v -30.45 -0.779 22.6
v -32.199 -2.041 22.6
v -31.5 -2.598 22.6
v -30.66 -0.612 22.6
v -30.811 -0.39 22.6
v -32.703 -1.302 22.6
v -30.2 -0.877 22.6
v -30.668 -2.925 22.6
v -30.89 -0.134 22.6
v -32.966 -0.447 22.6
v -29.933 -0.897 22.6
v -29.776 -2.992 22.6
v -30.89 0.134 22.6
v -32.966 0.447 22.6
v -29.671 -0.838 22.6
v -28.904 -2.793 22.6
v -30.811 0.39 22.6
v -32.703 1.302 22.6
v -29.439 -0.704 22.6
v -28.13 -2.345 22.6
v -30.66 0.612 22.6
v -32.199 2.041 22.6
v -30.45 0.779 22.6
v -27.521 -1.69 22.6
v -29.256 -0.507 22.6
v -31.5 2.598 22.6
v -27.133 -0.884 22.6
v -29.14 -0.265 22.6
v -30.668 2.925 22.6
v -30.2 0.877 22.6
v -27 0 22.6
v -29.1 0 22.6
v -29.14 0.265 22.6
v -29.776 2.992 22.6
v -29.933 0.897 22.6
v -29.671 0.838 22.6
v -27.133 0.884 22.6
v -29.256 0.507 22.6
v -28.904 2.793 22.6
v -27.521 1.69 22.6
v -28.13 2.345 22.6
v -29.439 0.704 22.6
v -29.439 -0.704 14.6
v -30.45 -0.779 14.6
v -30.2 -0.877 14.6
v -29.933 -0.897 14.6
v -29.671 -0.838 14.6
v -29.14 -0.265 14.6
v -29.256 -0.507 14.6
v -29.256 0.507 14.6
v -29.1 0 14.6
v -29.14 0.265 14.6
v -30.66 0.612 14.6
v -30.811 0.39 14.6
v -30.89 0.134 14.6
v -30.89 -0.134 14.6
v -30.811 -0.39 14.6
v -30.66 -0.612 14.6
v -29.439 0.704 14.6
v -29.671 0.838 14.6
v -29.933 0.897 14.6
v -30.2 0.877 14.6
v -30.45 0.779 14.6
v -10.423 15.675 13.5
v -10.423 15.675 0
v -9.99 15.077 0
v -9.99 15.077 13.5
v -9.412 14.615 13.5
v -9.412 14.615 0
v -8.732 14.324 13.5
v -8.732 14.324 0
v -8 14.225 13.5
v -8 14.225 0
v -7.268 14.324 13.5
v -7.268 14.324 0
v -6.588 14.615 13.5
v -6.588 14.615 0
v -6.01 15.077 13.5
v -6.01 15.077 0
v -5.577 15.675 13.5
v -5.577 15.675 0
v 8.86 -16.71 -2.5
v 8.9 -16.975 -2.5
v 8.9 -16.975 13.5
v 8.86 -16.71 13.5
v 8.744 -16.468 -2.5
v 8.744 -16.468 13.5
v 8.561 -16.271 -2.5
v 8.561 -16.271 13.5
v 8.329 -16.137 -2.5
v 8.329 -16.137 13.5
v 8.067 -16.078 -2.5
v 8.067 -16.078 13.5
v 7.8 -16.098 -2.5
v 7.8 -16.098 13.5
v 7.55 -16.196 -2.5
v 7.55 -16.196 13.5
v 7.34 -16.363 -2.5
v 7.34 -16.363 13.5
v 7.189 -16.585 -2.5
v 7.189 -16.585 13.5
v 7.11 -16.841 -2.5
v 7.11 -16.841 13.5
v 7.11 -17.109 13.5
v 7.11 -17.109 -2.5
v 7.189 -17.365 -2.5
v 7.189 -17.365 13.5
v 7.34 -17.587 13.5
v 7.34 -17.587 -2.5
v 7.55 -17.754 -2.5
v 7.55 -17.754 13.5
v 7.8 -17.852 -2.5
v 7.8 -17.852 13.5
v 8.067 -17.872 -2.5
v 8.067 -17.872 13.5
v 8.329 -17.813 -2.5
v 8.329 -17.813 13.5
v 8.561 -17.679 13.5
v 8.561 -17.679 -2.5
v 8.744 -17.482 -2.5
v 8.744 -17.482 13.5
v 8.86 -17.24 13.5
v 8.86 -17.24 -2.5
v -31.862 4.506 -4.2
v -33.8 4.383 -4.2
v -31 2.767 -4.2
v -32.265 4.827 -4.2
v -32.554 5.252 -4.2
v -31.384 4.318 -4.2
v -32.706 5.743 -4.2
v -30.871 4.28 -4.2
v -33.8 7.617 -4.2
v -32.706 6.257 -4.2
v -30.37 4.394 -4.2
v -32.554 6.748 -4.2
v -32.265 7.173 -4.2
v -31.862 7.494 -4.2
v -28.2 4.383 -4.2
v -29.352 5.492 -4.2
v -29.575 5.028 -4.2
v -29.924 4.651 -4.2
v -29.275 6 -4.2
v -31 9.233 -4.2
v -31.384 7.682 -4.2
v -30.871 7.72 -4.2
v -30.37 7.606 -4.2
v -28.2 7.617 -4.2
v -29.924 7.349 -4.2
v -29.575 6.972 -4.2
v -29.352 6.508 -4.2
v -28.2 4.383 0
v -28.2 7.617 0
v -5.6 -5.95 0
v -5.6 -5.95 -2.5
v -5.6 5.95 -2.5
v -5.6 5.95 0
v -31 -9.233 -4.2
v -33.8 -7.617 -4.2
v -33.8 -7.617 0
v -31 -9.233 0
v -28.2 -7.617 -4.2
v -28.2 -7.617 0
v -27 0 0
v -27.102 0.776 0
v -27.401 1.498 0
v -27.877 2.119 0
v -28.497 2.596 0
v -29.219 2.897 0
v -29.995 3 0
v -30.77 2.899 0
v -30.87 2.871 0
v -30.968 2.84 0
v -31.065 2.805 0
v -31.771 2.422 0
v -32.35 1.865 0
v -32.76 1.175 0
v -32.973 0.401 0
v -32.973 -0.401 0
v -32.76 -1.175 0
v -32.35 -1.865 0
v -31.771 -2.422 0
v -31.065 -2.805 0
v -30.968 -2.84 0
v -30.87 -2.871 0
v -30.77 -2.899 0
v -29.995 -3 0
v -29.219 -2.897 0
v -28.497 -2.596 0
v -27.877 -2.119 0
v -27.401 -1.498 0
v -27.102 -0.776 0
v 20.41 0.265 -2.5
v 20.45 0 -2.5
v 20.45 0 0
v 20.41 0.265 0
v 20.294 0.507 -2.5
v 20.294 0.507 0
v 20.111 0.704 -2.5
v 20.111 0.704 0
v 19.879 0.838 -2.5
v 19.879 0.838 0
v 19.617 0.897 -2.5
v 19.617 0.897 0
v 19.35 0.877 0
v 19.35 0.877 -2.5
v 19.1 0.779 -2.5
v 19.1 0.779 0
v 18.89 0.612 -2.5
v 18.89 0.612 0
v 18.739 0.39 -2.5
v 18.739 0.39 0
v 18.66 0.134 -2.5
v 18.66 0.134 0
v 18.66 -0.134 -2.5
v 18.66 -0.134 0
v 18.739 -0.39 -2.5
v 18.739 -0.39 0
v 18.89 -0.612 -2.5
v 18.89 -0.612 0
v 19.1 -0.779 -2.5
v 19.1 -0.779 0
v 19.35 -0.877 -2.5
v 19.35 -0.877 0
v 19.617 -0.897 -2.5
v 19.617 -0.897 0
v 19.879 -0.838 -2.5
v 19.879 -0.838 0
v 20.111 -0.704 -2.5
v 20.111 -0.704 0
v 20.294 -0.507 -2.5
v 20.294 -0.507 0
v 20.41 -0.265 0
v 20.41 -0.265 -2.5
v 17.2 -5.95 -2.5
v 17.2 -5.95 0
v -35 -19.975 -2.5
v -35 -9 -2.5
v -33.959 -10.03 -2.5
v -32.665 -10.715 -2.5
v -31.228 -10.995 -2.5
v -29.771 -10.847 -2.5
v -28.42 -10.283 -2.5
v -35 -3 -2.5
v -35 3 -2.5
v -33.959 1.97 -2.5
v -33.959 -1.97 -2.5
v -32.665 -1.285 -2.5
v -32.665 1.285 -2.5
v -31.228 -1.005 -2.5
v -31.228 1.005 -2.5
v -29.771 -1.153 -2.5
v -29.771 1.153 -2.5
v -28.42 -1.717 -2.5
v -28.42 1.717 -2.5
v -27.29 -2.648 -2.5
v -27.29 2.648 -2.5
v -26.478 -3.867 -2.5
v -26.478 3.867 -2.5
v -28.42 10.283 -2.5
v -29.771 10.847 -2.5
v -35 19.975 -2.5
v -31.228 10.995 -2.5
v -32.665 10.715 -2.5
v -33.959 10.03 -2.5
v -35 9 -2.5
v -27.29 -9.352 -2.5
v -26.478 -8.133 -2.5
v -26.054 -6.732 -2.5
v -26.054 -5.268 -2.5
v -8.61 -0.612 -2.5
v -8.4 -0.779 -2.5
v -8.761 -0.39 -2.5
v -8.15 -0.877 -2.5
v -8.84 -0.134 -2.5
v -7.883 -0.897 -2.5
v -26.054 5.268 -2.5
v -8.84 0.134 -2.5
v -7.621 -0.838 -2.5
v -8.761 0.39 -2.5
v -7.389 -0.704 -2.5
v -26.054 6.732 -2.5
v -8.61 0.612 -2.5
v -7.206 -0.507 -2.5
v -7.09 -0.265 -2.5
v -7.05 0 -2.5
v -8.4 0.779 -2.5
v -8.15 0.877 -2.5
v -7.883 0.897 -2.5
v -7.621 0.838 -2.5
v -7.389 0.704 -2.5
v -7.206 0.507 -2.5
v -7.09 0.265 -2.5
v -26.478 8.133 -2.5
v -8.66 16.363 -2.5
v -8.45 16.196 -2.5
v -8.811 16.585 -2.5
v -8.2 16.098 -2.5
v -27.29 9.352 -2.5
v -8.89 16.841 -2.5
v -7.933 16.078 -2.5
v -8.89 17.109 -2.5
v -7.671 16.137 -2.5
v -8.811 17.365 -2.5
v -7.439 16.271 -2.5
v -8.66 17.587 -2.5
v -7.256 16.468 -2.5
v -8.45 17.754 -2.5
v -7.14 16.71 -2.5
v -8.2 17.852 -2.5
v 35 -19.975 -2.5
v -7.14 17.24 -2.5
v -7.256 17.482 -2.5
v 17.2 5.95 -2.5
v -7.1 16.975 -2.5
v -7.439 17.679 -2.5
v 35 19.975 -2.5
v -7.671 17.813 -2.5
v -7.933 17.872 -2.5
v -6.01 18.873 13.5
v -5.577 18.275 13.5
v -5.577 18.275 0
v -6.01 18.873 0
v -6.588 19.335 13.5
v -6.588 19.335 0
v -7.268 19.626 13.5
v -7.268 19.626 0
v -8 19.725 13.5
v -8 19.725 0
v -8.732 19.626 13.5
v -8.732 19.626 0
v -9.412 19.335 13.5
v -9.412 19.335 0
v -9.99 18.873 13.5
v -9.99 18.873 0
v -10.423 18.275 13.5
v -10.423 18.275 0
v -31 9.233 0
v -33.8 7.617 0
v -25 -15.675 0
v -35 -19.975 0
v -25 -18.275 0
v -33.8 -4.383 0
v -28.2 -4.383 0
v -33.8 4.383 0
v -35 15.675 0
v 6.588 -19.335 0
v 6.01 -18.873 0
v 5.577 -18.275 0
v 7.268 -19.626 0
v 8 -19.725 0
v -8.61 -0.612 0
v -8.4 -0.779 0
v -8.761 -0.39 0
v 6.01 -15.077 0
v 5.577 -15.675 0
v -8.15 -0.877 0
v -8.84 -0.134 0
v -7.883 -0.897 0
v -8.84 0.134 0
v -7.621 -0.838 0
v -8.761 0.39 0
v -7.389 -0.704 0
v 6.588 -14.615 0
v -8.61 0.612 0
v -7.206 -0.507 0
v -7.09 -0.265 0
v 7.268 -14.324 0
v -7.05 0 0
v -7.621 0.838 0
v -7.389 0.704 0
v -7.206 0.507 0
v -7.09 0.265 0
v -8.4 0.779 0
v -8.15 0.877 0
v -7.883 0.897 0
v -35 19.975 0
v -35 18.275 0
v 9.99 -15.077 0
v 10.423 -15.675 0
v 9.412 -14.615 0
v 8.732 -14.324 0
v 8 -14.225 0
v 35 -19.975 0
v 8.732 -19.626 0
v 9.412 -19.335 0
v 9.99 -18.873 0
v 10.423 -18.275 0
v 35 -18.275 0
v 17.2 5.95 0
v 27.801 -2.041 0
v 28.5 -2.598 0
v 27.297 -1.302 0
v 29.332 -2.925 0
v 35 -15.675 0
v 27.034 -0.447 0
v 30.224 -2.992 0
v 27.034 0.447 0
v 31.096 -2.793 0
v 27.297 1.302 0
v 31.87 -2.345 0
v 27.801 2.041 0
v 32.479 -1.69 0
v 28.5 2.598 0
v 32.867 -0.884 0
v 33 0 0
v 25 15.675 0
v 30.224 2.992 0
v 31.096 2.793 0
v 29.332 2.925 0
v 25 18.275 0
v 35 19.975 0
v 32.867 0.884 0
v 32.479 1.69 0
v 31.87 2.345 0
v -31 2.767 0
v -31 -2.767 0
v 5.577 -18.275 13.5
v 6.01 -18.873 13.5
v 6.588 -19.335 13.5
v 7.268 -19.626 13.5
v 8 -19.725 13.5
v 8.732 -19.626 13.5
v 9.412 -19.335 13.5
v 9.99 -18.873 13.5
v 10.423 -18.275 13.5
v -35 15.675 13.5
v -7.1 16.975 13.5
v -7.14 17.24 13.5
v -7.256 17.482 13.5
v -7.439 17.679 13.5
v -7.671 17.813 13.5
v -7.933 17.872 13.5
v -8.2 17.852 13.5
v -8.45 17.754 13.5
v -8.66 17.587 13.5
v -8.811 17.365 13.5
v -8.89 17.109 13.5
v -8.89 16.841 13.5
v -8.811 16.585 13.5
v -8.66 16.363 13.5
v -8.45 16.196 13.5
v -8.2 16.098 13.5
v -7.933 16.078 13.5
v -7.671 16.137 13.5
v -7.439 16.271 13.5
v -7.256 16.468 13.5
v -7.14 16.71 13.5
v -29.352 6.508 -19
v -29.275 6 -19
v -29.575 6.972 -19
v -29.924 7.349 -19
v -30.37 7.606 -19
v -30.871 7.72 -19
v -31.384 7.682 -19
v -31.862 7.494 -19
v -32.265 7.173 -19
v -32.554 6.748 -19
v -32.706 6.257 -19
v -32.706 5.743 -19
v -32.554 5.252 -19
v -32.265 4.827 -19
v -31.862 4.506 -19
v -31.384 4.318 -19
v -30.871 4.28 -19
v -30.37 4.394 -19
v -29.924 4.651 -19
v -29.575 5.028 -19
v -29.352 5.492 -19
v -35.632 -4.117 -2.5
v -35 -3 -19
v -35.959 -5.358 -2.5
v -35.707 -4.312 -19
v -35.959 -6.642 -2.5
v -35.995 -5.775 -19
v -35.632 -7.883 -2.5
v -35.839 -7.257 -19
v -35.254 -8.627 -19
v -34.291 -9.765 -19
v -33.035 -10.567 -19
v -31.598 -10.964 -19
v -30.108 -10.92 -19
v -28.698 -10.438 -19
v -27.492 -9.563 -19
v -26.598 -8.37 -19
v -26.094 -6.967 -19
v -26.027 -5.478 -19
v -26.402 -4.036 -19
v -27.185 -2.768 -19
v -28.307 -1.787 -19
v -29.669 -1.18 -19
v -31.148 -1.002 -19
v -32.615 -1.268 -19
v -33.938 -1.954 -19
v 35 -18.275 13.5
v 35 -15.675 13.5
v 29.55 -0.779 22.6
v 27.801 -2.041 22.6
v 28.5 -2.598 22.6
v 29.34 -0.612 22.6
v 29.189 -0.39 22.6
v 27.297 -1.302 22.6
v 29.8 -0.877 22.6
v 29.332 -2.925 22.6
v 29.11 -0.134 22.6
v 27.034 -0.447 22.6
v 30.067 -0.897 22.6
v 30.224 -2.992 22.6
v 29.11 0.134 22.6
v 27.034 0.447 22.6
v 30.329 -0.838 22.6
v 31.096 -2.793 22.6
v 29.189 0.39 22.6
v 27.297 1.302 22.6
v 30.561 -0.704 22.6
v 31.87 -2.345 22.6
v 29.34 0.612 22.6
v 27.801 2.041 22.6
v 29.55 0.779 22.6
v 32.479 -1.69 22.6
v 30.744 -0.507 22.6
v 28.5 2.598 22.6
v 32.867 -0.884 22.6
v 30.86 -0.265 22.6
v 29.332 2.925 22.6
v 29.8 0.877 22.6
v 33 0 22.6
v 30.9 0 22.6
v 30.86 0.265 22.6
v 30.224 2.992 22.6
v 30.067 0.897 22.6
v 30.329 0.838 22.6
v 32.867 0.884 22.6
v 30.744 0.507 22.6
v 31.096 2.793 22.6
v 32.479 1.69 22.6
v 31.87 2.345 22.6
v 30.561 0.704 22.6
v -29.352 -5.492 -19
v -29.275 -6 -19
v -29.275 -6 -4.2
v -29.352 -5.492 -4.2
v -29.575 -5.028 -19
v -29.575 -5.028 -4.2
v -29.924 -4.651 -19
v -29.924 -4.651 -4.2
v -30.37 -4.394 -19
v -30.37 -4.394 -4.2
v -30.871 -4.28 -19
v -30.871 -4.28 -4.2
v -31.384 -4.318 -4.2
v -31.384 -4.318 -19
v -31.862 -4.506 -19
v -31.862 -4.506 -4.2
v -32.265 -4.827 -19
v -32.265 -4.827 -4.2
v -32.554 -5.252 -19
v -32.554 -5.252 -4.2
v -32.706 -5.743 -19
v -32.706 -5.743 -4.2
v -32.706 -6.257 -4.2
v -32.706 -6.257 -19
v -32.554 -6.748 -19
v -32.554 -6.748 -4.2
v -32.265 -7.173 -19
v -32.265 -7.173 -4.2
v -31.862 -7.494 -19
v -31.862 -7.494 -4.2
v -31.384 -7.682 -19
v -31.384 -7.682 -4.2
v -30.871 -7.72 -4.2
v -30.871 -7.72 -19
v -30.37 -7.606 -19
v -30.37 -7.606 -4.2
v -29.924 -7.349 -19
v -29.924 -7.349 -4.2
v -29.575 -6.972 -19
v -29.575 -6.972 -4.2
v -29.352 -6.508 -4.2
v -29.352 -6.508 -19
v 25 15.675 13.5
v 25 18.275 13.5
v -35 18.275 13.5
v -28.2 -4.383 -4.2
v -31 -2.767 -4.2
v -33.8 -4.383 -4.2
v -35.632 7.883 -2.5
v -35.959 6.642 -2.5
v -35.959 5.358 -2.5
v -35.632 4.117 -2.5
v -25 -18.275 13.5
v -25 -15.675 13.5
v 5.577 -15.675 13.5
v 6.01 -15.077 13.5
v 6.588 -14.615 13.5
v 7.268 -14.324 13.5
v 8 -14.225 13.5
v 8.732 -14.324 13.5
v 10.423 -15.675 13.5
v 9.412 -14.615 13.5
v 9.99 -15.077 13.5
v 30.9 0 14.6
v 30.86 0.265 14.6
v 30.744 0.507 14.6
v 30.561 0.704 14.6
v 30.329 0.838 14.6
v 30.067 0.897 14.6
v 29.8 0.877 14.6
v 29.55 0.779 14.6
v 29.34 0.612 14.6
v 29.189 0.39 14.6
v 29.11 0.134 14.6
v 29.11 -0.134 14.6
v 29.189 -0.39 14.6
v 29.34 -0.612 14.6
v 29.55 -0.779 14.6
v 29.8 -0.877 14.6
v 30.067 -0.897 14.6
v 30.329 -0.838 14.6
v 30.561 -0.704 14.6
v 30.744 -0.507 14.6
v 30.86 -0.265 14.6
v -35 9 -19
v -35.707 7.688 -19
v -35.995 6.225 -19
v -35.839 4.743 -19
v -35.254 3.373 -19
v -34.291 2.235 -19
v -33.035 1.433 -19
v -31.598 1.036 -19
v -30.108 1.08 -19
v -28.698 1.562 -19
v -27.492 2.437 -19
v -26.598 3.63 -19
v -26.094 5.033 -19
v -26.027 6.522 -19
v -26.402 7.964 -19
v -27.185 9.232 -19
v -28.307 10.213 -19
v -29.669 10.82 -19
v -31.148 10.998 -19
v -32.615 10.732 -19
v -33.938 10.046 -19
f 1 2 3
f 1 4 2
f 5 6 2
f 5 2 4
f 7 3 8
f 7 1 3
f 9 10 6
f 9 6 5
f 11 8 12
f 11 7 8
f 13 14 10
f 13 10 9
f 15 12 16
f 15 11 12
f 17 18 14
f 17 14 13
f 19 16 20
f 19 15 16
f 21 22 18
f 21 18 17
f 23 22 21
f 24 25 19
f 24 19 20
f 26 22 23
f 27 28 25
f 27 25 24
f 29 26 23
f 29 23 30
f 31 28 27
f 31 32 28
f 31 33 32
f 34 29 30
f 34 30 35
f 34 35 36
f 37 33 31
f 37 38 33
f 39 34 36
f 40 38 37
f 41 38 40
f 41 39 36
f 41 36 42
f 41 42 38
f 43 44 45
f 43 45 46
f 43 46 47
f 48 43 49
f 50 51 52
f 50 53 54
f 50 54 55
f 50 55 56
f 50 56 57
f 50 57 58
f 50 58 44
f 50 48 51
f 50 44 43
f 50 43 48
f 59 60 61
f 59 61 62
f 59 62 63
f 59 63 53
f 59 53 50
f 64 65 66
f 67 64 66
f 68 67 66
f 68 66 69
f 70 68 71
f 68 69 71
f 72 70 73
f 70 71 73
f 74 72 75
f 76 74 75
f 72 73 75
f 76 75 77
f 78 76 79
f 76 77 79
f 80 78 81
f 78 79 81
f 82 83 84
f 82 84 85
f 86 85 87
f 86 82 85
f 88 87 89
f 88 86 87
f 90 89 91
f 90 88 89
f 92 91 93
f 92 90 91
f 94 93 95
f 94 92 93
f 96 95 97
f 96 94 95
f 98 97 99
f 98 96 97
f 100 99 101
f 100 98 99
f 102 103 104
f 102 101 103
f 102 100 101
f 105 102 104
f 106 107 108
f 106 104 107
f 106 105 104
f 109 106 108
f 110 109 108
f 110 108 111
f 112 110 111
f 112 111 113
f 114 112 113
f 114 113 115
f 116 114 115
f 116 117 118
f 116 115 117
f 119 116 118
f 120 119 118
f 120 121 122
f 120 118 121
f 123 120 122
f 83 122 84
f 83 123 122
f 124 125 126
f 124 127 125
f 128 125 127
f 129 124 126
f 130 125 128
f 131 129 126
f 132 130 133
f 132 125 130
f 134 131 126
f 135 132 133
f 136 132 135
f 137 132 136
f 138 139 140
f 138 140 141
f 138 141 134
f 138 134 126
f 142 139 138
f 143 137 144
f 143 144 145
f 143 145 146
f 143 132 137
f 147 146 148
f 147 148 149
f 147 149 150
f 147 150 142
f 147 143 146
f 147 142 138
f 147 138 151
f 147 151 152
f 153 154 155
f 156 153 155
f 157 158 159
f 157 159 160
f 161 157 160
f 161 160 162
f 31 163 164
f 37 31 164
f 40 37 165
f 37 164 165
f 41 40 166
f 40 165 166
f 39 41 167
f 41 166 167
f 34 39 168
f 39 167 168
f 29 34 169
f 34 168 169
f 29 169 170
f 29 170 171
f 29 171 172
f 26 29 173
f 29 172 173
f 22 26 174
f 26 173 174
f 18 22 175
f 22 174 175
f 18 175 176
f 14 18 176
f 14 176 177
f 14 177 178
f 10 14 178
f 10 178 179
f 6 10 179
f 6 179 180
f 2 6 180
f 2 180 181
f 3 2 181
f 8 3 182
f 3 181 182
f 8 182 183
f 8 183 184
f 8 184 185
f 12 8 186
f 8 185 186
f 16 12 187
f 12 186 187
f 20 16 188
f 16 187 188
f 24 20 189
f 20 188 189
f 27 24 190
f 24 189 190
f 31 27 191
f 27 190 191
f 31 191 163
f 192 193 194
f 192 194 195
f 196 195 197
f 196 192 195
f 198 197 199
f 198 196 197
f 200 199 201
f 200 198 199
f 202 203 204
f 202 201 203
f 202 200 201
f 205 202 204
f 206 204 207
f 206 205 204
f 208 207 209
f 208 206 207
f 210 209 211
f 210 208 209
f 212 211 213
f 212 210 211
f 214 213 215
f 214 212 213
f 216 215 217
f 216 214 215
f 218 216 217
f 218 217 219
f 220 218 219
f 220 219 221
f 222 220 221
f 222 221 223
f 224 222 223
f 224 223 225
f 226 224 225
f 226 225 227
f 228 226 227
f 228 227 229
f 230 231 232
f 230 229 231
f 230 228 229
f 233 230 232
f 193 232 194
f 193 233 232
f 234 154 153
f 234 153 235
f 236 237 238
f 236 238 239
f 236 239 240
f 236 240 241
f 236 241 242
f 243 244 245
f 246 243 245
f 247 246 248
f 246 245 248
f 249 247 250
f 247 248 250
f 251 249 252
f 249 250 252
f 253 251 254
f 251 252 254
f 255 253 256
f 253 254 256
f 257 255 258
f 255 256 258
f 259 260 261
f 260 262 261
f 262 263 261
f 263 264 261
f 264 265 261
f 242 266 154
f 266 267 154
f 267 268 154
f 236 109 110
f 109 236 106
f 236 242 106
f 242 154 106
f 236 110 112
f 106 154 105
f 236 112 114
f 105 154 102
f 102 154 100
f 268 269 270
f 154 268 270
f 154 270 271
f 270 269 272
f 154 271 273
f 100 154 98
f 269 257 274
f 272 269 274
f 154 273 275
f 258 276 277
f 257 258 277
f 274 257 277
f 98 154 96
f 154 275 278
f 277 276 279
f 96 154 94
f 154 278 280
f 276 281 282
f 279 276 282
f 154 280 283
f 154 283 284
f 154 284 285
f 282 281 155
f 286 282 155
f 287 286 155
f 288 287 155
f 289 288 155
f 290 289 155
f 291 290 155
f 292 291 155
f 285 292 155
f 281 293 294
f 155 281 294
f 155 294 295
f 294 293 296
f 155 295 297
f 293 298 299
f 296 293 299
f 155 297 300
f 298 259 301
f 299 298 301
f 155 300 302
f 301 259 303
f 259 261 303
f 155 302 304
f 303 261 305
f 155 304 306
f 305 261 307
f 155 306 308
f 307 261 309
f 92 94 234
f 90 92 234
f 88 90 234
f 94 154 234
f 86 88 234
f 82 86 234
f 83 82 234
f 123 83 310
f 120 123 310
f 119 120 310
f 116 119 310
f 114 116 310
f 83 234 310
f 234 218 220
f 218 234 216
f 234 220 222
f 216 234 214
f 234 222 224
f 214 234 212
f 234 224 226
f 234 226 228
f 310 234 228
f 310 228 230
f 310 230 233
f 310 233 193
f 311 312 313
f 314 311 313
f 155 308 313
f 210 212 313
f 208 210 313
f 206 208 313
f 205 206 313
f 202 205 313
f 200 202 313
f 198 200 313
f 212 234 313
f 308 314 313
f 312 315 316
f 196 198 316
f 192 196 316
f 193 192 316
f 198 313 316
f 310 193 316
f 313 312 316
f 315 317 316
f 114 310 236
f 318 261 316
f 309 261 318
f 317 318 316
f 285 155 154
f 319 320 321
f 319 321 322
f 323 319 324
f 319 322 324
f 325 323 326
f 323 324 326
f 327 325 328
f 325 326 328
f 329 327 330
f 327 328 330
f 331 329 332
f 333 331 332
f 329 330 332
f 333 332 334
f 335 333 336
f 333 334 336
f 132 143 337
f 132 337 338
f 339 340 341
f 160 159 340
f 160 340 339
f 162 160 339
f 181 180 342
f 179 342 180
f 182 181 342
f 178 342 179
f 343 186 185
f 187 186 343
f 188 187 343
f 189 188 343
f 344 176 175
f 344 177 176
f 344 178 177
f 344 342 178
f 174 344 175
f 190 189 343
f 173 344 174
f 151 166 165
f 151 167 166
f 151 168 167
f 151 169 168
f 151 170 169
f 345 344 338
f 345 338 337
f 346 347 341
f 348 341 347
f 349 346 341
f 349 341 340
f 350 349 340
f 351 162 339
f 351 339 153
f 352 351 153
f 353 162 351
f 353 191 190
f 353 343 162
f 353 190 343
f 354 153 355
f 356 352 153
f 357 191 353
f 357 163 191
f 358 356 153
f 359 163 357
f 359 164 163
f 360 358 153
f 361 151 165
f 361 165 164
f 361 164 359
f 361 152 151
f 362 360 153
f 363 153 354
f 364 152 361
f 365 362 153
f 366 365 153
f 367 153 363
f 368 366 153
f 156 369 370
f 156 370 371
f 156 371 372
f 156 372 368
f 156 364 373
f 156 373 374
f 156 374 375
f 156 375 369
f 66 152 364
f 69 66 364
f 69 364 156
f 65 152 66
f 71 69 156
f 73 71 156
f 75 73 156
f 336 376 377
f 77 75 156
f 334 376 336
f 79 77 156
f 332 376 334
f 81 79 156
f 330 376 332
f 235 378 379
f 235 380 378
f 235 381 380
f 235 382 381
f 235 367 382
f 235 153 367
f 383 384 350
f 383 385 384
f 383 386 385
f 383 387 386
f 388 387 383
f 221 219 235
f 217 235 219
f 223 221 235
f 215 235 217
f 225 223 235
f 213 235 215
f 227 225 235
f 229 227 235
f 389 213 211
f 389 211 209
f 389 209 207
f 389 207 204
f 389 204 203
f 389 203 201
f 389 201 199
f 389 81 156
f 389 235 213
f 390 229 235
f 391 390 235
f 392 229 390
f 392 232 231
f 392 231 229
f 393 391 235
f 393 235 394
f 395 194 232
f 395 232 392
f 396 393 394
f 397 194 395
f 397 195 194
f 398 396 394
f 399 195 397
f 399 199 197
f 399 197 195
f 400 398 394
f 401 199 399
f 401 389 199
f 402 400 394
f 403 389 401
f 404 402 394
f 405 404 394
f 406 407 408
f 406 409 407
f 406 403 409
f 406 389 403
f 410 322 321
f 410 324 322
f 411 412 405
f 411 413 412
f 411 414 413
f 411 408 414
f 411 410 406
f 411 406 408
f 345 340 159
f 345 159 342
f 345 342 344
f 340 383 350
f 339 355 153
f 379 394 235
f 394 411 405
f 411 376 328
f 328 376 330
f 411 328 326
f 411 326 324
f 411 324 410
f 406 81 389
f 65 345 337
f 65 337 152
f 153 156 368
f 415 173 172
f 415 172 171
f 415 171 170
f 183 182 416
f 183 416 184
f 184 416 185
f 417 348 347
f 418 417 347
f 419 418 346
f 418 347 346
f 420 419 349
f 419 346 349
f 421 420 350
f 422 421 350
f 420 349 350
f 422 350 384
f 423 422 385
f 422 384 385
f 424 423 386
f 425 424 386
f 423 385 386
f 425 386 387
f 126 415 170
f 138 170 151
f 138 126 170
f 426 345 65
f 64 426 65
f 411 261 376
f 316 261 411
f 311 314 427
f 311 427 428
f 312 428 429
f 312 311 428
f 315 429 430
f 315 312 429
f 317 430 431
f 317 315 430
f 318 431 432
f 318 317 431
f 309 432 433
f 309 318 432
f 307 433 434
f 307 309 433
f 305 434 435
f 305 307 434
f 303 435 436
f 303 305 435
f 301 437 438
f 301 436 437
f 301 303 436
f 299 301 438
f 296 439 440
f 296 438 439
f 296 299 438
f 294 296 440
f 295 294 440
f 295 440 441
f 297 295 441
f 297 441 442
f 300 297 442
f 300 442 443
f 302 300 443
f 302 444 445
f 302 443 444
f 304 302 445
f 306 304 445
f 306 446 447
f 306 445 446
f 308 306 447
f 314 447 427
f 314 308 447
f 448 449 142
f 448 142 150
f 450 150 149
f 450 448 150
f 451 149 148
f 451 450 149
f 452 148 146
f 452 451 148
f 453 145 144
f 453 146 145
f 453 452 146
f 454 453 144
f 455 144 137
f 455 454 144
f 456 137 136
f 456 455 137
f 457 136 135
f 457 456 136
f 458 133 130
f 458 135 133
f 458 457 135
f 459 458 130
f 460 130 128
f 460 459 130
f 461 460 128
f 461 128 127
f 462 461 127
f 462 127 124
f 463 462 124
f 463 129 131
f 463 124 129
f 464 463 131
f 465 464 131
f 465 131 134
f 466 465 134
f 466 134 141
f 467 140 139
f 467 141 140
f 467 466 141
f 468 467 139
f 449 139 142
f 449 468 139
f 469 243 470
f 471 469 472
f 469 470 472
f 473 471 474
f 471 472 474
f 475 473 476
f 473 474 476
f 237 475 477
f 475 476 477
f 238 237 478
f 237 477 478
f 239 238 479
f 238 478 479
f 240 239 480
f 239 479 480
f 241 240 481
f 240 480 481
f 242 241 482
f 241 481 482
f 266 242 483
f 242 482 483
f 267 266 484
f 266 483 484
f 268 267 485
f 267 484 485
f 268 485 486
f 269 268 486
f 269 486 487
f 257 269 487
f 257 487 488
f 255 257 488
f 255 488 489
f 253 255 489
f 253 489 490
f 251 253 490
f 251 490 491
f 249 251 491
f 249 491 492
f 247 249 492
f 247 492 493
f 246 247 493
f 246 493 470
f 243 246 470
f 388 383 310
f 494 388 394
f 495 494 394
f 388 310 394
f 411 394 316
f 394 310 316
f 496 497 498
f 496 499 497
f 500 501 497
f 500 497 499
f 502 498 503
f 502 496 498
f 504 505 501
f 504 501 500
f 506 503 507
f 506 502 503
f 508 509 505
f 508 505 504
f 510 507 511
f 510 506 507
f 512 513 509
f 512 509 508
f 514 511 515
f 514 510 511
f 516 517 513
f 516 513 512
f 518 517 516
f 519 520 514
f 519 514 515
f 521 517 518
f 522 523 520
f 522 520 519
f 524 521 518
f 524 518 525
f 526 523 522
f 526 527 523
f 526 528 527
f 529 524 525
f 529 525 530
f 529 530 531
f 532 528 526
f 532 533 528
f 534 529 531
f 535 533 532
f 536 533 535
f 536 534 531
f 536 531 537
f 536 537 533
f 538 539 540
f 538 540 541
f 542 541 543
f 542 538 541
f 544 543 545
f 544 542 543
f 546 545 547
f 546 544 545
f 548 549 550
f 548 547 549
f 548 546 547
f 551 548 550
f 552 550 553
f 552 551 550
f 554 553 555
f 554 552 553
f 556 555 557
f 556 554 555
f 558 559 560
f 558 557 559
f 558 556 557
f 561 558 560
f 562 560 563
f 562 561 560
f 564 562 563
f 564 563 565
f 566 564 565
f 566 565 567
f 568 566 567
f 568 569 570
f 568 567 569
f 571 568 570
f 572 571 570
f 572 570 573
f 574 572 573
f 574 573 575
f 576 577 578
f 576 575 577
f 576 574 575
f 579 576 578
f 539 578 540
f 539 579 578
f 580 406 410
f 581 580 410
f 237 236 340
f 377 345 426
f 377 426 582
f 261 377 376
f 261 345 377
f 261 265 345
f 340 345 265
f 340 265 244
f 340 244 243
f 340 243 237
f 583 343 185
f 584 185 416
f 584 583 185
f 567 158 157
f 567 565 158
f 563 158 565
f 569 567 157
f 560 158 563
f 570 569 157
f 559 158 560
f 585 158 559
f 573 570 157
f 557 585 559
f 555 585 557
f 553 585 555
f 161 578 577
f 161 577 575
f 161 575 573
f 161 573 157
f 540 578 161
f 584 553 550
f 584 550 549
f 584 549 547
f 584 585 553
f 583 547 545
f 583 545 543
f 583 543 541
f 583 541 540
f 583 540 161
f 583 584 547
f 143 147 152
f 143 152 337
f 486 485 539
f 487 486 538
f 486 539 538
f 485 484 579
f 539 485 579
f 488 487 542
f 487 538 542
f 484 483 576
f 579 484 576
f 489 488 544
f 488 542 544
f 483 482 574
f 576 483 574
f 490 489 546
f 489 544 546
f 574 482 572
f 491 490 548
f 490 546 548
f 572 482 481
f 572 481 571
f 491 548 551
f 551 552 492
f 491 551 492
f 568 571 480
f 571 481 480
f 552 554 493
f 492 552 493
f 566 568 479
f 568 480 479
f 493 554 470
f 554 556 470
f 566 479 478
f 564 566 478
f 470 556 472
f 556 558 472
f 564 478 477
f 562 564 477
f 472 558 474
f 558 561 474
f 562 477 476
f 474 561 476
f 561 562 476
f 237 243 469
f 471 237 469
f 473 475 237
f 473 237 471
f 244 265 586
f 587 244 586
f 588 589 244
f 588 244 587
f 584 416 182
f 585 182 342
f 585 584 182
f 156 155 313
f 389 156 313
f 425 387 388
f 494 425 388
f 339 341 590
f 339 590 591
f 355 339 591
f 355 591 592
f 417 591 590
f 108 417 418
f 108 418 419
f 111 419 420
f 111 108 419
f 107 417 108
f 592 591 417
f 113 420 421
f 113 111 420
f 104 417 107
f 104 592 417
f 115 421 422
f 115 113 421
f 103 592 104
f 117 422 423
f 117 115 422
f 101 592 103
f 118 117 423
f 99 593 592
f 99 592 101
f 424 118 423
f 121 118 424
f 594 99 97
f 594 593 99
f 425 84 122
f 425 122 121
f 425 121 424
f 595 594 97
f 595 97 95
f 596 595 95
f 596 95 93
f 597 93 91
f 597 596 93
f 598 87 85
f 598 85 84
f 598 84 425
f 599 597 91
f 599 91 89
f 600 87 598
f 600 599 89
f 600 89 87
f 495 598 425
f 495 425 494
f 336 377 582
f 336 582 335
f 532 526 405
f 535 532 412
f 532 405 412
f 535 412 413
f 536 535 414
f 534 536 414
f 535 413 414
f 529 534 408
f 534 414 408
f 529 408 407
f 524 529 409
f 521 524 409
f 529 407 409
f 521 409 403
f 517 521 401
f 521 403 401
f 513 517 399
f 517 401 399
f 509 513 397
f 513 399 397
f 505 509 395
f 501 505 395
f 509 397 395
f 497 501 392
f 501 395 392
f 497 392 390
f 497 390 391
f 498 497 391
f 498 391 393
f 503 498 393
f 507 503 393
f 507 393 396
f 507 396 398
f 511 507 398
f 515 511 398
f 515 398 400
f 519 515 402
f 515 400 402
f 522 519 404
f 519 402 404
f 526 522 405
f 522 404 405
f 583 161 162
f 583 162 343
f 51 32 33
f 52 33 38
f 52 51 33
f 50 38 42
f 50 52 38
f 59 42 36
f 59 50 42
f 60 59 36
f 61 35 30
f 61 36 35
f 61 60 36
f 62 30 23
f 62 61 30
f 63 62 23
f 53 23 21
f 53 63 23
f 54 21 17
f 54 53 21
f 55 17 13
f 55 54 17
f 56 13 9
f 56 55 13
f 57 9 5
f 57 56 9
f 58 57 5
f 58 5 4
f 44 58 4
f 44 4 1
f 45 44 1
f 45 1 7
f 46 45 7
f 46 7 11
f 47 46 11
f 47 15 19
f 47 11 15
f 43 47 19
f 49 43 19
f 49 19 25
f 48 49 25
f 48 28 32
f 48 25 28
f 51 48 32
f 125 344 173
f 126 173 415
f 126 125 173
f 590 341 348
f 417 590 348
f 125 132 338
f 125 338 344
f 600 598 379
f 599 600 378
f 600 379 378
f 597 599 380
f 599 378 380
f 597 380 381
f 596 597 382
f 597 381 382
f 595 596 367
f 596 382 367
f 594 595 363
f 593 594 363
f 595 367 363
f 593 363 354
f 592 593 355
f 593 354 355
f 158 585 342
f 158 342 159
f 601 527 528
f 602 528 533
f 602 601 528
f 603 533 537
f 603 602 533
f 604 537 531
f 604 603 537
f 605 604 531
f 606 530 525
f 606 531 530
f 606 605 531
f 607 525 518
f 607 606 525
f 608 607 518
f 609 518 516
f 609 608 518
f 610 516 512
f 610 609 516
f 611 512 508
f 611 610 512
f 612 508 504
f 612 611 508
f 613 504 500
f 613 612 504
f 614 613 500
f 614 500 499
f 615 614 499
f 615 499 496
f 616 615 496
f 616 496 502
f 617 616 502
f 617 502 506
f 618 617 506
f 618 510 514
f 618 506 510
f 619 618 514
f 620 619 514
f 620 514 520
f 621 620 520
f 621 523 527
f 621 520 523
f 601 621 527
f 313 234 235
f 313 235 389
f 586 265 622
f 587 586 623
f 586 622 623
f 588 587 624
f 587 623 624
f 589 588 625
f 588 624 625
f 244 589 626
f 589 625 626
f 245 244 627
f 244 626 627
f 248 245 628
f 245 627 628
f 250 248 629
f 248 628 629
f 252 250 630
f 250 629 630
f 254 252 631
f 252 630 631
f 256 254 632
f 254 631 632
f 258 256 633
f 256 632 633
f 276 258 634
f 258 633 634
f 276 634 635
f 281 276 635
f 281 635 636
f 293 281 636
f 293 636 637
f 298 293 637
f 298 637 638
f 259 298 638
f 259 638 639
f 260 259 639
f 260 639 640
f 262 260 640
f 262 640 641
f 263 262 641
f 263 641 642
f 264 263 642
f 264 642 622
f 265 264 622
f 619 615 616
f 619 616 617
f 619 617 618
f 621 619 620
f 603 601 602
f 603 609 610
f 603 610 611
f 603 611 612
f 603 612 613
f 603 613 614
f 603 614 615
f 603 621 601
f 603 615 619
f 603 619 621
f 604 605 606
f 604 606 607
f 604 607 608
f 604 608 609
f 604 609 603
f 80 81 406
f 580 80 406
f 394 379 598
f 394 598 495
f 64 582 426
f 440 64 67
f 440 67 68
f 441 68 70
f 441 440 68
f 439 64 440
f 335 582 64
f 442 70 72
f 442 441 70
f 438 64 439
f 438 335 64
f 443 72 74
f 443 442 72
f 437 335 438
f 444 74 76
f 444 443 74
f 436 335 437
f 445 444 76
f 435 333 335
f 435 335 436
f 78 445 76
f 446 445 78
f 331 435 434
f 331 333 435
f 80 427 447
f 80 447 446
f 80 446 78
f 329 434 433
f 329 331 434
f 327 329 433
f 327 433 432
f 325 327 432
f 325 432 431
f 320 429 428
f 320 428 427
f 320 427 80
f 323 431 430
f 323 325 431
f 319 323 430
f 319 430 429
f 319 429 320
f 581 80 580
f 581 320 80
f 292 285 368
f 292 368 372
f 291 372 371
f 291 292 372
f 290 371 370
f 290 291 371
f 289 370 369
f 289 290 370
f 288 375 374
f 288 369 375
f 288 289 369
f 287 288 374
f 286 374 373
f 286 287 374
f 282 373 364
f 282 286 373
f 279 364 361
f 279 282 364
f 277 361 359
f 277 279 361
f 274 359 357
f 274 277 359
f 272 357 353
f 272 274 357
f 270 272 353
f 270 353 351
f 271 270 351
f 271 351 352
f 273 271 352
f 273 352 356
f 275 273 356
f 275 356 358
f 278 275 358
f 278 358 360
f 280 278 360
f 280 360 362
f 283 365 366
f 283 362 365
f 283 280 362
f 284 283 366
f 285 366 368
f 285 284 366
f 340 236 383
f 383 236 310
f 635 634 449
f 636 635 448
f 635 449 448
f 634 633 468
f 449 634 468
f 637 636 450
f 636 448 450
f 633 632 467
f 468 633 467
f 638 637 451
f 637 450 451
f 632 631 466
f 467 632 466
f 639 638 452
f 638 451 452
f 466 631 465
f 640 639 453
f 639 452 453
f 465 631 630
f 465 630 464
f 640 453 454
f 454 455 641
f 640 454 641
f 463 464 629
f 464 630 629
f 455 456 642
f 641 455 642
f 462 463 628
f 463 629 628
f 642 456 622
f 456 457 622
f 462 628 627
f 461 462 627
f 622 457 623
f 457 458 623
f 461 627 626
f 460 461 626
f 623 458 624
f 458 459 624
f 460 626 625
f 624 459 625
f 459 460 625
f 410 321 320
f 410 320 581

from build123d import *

# Parameters (mm, degrees)
BOSS_EXTRUDE1_START     = -2.5
SKETCH1_W               = 70
SKETCH1_H               = 39.95
BOSS_EXTRUDE1_DEPTH     = 2.5
SKETCH2_W               = 60
SKETCH2_H               = 2.6
BOSS_EXTRUDE2_DEPTH     = 13.5
SKETCH3_W               = 60
SKETCH3_H               = 2.6
BOSS_EXTRUDE3_DEPTH     = 13.5
SKETCH4_R               = 2.75
BOSS_EXTRUDE4_DEPTH     = 13.5
BOSS_EXTRUDE5_START     = -19
SKETCH5_R               = 5
BOSS_EXTRUDE5_DEPTH     = 16.5
SKETCH6_R               = 3
BOSS_EXTRUDE6_DEPTH     = 22.6
CUT_EXTRUDE1_START      = 14.6
SKETCH7_R               = 0.9
CUT_EXTRUDE1_DEPTH      = 8.1
CUT_EXTRUDE2_DEPTH      = 47.965525921
CUT_EXTRUDE2_DEPTH_BACK = 47.965525921
SKETCH8_W               = 22.8
SKETCH8_H               = 11.9
CUT_EXTRUDE3_DEPTH      = 47.965525921
CUT_EXTRUDE3_DEPTH_BACK = 47.965525921
SKETCH9_R               = 0.9
CUT_EXTRUDE4_DEPTH      = 47.965525921
CUT_EXTRUDE4_DEPTH_BACK = 47.965525921
SKETCH10_R              = 0.9
CUT_EXTRUDE5_DEPTH      = 47.965525921
CUT_EXTRUDE5_DEPTH_BACK = 47.965525921
SKETCH11_R              = 1.725
CUT_EXTRUDE6_START      = -4.2
CUT_EXTRUDE6_DEPTH      = 4.2


with BuildPart() as part:
    # Sketch1 → Boss-Extrude1 (new body)
    with BuildSketch(Plane.XY.offset(BOSS_EXTRUDE1_START)):
        Rectangle(SKETCH1_W, SKETCH1_H)
    extrude(amount=BOSS_EXTRUDE1_DEPTH)

    # Sketch2 → Boss-Extrude2 (add)
    with BuildSketch(Plane.XY):
        with Locations((-5, 16.975)):
            Rectangle(SKETCH2_W, SKETCH2_H)
    extrude(amount=BOSS_EXTRUDE2_DEPTH)

    # Sketch3 → Boss-Extrude3 (add)
    with BuildSketch(Plane.XY):
        with Locations((5, -16.975)):
            Rectangle(SKETCH3_W, SKETCH3_H)
    extrude(amount=BOSS_EXTRUDE3_DEPTH)

    # Sketch4 → Boss-Extrude4 (add)
    with BuildSketch(Plane.XY):
        with Locations((-8, 16.975)):
            Circle(SKETCH4_R)
        with Locations((8, -16.975)):
            Circle(SKETCH4_R)
    extrude(amount=BOSS_EXTRUDE4_DEPTH)

    # Sketch5 → Boss-Extrude5 (add)
    with BuildSketch(Plane.XY.offset(BOSS_EXTRUDE5_START)):
        with Locations(Location((-31, 6, 0), (0, 0, 143.130102354))):
            Circle(SKETCH5_R)
        with Locations(Location((-31, -6, 0), (0, 0, 143.130102354))):
            Circle(SKETCH5_R)
    extrude(amount=BOSS_EXTRUDE5_DEPTH)

    # Sketch6 → Boss-Extrude6 (add)
    with BuildSketch(Plane.XY):
        with Locations((30, 0)):
            Circle(SKETCH6_R)
        with Locations((-30, 0)):
            Circle(SKETCH6_R)
    extrude(amount=BOSS_EXTRUDE6_DEPTH)

    # Sketch7 → Cut-Extrude1 (cut)
    with BuildSketch(Plane.XY.offset(CUT_EXTRUDE1_START)):
        with Locations((30, 0)):
            Circle(SKETCH7_R)
        with Locations((-30, 0)):
            Circle(SKETCH7_R)
    extrude(amount=CUT_EXTRUDE1_DEPTH, mode=Mode.SUBTRACT)

    # Sketch8 → Cut-Extrude2 (cut, two sides: drawn at the far end of the back side and taken through both)
    with BuildSketch(Plane.XY.offset(-CUT_EXTRUDE2_DEPTH_BACK)):
        with Locations((5.8, 0)):
            Rectangle(SKETCH8_W, SKETCH8_H)
    extrude(amount=CUT_EXTRUDE2_DEPTH + CUT_EXTRUDE2_DEPTH_BACK, mode=Mode.SUBTRACT)

    # Sketch9 → Cut-Extrude3 (cut, two sides: drawn at the far end of the back side and taken through both)
    with BuildSketch(Plane.XY.offset(-CUT_EXTRUDE3_DEPTH_BACK)):
        with Locations((-7.95, 0)):
            Circle(SKETCH9_R)
        with Locations((19.55, 0)):
            Circle(SKETCH9_R)
    extrude(amount=CUT_EXTRUDE3_DEPTH + CUT_EXTRUDE3_DEPTH_BACK, mode=Mode.SUBTRACT)

    # Sketch10 → Cut-Extrude4 (cut, two sides: drawn at the far end of the back side and taken through both)
    with BuildSketch(Plane.XY.offset(-CUT_EXTRUDE4_DEPTH_BACK)):
        with Locations((-8, 16.975)):
            Circle(SKETCH10_R)
        with Locations((8, -16.975)):
            Circle(SKETCH10_R)
    extrude(amount=CUT_EXTRUDE4_DEPTH + CUT_EXTRUDE4_DEPTH_BACK, mode=Mode.SUBTRACT)

    # Sketch11 → Cut-Extrude5 (cut, two sides: drawn at the far end of the back side and taken through both)
    with BuildSketch(Plane.XY.offset(-CUT_EXTRUDE5_DEPTH_BACK)):
        with Locations((-31, 6)):
            Circle(SKETCH11_R)
        with Locations((-31, -6)):
            Circle(SKETCH11_R)
    extrude(amount=CUT_EXTRUDE5_DEPTH + CUT_EXTRUDE5_DEPTH_BACK, mode=Mode.SUBTRACT)

    # Sketch12 → Cut-Extrude6 (cut)
    with BuildSketch(Plane.XY.offset(CUT_EXTRUDE6_START)):
        Polygon((-28.2, 7.616580754), (-31, 9.233161507), (-33.8, 7.616580754), (-33.8, 4.383419246), (-31, 2.766838493), (-28.2, 4.383419246), align=None)
        Polygon((-28.2, -4.383419246), (-31, -2.766838493), (-33.8, -4.383419246), (-33.8, -7.616580754), (-31, -9.233161507), (-28.2, -7.616580754), align=None)
    extrude(amount=CUT_EXTRUDE6_DEPTH, mode=Mode.SUBTRACT)


solid = part.part
